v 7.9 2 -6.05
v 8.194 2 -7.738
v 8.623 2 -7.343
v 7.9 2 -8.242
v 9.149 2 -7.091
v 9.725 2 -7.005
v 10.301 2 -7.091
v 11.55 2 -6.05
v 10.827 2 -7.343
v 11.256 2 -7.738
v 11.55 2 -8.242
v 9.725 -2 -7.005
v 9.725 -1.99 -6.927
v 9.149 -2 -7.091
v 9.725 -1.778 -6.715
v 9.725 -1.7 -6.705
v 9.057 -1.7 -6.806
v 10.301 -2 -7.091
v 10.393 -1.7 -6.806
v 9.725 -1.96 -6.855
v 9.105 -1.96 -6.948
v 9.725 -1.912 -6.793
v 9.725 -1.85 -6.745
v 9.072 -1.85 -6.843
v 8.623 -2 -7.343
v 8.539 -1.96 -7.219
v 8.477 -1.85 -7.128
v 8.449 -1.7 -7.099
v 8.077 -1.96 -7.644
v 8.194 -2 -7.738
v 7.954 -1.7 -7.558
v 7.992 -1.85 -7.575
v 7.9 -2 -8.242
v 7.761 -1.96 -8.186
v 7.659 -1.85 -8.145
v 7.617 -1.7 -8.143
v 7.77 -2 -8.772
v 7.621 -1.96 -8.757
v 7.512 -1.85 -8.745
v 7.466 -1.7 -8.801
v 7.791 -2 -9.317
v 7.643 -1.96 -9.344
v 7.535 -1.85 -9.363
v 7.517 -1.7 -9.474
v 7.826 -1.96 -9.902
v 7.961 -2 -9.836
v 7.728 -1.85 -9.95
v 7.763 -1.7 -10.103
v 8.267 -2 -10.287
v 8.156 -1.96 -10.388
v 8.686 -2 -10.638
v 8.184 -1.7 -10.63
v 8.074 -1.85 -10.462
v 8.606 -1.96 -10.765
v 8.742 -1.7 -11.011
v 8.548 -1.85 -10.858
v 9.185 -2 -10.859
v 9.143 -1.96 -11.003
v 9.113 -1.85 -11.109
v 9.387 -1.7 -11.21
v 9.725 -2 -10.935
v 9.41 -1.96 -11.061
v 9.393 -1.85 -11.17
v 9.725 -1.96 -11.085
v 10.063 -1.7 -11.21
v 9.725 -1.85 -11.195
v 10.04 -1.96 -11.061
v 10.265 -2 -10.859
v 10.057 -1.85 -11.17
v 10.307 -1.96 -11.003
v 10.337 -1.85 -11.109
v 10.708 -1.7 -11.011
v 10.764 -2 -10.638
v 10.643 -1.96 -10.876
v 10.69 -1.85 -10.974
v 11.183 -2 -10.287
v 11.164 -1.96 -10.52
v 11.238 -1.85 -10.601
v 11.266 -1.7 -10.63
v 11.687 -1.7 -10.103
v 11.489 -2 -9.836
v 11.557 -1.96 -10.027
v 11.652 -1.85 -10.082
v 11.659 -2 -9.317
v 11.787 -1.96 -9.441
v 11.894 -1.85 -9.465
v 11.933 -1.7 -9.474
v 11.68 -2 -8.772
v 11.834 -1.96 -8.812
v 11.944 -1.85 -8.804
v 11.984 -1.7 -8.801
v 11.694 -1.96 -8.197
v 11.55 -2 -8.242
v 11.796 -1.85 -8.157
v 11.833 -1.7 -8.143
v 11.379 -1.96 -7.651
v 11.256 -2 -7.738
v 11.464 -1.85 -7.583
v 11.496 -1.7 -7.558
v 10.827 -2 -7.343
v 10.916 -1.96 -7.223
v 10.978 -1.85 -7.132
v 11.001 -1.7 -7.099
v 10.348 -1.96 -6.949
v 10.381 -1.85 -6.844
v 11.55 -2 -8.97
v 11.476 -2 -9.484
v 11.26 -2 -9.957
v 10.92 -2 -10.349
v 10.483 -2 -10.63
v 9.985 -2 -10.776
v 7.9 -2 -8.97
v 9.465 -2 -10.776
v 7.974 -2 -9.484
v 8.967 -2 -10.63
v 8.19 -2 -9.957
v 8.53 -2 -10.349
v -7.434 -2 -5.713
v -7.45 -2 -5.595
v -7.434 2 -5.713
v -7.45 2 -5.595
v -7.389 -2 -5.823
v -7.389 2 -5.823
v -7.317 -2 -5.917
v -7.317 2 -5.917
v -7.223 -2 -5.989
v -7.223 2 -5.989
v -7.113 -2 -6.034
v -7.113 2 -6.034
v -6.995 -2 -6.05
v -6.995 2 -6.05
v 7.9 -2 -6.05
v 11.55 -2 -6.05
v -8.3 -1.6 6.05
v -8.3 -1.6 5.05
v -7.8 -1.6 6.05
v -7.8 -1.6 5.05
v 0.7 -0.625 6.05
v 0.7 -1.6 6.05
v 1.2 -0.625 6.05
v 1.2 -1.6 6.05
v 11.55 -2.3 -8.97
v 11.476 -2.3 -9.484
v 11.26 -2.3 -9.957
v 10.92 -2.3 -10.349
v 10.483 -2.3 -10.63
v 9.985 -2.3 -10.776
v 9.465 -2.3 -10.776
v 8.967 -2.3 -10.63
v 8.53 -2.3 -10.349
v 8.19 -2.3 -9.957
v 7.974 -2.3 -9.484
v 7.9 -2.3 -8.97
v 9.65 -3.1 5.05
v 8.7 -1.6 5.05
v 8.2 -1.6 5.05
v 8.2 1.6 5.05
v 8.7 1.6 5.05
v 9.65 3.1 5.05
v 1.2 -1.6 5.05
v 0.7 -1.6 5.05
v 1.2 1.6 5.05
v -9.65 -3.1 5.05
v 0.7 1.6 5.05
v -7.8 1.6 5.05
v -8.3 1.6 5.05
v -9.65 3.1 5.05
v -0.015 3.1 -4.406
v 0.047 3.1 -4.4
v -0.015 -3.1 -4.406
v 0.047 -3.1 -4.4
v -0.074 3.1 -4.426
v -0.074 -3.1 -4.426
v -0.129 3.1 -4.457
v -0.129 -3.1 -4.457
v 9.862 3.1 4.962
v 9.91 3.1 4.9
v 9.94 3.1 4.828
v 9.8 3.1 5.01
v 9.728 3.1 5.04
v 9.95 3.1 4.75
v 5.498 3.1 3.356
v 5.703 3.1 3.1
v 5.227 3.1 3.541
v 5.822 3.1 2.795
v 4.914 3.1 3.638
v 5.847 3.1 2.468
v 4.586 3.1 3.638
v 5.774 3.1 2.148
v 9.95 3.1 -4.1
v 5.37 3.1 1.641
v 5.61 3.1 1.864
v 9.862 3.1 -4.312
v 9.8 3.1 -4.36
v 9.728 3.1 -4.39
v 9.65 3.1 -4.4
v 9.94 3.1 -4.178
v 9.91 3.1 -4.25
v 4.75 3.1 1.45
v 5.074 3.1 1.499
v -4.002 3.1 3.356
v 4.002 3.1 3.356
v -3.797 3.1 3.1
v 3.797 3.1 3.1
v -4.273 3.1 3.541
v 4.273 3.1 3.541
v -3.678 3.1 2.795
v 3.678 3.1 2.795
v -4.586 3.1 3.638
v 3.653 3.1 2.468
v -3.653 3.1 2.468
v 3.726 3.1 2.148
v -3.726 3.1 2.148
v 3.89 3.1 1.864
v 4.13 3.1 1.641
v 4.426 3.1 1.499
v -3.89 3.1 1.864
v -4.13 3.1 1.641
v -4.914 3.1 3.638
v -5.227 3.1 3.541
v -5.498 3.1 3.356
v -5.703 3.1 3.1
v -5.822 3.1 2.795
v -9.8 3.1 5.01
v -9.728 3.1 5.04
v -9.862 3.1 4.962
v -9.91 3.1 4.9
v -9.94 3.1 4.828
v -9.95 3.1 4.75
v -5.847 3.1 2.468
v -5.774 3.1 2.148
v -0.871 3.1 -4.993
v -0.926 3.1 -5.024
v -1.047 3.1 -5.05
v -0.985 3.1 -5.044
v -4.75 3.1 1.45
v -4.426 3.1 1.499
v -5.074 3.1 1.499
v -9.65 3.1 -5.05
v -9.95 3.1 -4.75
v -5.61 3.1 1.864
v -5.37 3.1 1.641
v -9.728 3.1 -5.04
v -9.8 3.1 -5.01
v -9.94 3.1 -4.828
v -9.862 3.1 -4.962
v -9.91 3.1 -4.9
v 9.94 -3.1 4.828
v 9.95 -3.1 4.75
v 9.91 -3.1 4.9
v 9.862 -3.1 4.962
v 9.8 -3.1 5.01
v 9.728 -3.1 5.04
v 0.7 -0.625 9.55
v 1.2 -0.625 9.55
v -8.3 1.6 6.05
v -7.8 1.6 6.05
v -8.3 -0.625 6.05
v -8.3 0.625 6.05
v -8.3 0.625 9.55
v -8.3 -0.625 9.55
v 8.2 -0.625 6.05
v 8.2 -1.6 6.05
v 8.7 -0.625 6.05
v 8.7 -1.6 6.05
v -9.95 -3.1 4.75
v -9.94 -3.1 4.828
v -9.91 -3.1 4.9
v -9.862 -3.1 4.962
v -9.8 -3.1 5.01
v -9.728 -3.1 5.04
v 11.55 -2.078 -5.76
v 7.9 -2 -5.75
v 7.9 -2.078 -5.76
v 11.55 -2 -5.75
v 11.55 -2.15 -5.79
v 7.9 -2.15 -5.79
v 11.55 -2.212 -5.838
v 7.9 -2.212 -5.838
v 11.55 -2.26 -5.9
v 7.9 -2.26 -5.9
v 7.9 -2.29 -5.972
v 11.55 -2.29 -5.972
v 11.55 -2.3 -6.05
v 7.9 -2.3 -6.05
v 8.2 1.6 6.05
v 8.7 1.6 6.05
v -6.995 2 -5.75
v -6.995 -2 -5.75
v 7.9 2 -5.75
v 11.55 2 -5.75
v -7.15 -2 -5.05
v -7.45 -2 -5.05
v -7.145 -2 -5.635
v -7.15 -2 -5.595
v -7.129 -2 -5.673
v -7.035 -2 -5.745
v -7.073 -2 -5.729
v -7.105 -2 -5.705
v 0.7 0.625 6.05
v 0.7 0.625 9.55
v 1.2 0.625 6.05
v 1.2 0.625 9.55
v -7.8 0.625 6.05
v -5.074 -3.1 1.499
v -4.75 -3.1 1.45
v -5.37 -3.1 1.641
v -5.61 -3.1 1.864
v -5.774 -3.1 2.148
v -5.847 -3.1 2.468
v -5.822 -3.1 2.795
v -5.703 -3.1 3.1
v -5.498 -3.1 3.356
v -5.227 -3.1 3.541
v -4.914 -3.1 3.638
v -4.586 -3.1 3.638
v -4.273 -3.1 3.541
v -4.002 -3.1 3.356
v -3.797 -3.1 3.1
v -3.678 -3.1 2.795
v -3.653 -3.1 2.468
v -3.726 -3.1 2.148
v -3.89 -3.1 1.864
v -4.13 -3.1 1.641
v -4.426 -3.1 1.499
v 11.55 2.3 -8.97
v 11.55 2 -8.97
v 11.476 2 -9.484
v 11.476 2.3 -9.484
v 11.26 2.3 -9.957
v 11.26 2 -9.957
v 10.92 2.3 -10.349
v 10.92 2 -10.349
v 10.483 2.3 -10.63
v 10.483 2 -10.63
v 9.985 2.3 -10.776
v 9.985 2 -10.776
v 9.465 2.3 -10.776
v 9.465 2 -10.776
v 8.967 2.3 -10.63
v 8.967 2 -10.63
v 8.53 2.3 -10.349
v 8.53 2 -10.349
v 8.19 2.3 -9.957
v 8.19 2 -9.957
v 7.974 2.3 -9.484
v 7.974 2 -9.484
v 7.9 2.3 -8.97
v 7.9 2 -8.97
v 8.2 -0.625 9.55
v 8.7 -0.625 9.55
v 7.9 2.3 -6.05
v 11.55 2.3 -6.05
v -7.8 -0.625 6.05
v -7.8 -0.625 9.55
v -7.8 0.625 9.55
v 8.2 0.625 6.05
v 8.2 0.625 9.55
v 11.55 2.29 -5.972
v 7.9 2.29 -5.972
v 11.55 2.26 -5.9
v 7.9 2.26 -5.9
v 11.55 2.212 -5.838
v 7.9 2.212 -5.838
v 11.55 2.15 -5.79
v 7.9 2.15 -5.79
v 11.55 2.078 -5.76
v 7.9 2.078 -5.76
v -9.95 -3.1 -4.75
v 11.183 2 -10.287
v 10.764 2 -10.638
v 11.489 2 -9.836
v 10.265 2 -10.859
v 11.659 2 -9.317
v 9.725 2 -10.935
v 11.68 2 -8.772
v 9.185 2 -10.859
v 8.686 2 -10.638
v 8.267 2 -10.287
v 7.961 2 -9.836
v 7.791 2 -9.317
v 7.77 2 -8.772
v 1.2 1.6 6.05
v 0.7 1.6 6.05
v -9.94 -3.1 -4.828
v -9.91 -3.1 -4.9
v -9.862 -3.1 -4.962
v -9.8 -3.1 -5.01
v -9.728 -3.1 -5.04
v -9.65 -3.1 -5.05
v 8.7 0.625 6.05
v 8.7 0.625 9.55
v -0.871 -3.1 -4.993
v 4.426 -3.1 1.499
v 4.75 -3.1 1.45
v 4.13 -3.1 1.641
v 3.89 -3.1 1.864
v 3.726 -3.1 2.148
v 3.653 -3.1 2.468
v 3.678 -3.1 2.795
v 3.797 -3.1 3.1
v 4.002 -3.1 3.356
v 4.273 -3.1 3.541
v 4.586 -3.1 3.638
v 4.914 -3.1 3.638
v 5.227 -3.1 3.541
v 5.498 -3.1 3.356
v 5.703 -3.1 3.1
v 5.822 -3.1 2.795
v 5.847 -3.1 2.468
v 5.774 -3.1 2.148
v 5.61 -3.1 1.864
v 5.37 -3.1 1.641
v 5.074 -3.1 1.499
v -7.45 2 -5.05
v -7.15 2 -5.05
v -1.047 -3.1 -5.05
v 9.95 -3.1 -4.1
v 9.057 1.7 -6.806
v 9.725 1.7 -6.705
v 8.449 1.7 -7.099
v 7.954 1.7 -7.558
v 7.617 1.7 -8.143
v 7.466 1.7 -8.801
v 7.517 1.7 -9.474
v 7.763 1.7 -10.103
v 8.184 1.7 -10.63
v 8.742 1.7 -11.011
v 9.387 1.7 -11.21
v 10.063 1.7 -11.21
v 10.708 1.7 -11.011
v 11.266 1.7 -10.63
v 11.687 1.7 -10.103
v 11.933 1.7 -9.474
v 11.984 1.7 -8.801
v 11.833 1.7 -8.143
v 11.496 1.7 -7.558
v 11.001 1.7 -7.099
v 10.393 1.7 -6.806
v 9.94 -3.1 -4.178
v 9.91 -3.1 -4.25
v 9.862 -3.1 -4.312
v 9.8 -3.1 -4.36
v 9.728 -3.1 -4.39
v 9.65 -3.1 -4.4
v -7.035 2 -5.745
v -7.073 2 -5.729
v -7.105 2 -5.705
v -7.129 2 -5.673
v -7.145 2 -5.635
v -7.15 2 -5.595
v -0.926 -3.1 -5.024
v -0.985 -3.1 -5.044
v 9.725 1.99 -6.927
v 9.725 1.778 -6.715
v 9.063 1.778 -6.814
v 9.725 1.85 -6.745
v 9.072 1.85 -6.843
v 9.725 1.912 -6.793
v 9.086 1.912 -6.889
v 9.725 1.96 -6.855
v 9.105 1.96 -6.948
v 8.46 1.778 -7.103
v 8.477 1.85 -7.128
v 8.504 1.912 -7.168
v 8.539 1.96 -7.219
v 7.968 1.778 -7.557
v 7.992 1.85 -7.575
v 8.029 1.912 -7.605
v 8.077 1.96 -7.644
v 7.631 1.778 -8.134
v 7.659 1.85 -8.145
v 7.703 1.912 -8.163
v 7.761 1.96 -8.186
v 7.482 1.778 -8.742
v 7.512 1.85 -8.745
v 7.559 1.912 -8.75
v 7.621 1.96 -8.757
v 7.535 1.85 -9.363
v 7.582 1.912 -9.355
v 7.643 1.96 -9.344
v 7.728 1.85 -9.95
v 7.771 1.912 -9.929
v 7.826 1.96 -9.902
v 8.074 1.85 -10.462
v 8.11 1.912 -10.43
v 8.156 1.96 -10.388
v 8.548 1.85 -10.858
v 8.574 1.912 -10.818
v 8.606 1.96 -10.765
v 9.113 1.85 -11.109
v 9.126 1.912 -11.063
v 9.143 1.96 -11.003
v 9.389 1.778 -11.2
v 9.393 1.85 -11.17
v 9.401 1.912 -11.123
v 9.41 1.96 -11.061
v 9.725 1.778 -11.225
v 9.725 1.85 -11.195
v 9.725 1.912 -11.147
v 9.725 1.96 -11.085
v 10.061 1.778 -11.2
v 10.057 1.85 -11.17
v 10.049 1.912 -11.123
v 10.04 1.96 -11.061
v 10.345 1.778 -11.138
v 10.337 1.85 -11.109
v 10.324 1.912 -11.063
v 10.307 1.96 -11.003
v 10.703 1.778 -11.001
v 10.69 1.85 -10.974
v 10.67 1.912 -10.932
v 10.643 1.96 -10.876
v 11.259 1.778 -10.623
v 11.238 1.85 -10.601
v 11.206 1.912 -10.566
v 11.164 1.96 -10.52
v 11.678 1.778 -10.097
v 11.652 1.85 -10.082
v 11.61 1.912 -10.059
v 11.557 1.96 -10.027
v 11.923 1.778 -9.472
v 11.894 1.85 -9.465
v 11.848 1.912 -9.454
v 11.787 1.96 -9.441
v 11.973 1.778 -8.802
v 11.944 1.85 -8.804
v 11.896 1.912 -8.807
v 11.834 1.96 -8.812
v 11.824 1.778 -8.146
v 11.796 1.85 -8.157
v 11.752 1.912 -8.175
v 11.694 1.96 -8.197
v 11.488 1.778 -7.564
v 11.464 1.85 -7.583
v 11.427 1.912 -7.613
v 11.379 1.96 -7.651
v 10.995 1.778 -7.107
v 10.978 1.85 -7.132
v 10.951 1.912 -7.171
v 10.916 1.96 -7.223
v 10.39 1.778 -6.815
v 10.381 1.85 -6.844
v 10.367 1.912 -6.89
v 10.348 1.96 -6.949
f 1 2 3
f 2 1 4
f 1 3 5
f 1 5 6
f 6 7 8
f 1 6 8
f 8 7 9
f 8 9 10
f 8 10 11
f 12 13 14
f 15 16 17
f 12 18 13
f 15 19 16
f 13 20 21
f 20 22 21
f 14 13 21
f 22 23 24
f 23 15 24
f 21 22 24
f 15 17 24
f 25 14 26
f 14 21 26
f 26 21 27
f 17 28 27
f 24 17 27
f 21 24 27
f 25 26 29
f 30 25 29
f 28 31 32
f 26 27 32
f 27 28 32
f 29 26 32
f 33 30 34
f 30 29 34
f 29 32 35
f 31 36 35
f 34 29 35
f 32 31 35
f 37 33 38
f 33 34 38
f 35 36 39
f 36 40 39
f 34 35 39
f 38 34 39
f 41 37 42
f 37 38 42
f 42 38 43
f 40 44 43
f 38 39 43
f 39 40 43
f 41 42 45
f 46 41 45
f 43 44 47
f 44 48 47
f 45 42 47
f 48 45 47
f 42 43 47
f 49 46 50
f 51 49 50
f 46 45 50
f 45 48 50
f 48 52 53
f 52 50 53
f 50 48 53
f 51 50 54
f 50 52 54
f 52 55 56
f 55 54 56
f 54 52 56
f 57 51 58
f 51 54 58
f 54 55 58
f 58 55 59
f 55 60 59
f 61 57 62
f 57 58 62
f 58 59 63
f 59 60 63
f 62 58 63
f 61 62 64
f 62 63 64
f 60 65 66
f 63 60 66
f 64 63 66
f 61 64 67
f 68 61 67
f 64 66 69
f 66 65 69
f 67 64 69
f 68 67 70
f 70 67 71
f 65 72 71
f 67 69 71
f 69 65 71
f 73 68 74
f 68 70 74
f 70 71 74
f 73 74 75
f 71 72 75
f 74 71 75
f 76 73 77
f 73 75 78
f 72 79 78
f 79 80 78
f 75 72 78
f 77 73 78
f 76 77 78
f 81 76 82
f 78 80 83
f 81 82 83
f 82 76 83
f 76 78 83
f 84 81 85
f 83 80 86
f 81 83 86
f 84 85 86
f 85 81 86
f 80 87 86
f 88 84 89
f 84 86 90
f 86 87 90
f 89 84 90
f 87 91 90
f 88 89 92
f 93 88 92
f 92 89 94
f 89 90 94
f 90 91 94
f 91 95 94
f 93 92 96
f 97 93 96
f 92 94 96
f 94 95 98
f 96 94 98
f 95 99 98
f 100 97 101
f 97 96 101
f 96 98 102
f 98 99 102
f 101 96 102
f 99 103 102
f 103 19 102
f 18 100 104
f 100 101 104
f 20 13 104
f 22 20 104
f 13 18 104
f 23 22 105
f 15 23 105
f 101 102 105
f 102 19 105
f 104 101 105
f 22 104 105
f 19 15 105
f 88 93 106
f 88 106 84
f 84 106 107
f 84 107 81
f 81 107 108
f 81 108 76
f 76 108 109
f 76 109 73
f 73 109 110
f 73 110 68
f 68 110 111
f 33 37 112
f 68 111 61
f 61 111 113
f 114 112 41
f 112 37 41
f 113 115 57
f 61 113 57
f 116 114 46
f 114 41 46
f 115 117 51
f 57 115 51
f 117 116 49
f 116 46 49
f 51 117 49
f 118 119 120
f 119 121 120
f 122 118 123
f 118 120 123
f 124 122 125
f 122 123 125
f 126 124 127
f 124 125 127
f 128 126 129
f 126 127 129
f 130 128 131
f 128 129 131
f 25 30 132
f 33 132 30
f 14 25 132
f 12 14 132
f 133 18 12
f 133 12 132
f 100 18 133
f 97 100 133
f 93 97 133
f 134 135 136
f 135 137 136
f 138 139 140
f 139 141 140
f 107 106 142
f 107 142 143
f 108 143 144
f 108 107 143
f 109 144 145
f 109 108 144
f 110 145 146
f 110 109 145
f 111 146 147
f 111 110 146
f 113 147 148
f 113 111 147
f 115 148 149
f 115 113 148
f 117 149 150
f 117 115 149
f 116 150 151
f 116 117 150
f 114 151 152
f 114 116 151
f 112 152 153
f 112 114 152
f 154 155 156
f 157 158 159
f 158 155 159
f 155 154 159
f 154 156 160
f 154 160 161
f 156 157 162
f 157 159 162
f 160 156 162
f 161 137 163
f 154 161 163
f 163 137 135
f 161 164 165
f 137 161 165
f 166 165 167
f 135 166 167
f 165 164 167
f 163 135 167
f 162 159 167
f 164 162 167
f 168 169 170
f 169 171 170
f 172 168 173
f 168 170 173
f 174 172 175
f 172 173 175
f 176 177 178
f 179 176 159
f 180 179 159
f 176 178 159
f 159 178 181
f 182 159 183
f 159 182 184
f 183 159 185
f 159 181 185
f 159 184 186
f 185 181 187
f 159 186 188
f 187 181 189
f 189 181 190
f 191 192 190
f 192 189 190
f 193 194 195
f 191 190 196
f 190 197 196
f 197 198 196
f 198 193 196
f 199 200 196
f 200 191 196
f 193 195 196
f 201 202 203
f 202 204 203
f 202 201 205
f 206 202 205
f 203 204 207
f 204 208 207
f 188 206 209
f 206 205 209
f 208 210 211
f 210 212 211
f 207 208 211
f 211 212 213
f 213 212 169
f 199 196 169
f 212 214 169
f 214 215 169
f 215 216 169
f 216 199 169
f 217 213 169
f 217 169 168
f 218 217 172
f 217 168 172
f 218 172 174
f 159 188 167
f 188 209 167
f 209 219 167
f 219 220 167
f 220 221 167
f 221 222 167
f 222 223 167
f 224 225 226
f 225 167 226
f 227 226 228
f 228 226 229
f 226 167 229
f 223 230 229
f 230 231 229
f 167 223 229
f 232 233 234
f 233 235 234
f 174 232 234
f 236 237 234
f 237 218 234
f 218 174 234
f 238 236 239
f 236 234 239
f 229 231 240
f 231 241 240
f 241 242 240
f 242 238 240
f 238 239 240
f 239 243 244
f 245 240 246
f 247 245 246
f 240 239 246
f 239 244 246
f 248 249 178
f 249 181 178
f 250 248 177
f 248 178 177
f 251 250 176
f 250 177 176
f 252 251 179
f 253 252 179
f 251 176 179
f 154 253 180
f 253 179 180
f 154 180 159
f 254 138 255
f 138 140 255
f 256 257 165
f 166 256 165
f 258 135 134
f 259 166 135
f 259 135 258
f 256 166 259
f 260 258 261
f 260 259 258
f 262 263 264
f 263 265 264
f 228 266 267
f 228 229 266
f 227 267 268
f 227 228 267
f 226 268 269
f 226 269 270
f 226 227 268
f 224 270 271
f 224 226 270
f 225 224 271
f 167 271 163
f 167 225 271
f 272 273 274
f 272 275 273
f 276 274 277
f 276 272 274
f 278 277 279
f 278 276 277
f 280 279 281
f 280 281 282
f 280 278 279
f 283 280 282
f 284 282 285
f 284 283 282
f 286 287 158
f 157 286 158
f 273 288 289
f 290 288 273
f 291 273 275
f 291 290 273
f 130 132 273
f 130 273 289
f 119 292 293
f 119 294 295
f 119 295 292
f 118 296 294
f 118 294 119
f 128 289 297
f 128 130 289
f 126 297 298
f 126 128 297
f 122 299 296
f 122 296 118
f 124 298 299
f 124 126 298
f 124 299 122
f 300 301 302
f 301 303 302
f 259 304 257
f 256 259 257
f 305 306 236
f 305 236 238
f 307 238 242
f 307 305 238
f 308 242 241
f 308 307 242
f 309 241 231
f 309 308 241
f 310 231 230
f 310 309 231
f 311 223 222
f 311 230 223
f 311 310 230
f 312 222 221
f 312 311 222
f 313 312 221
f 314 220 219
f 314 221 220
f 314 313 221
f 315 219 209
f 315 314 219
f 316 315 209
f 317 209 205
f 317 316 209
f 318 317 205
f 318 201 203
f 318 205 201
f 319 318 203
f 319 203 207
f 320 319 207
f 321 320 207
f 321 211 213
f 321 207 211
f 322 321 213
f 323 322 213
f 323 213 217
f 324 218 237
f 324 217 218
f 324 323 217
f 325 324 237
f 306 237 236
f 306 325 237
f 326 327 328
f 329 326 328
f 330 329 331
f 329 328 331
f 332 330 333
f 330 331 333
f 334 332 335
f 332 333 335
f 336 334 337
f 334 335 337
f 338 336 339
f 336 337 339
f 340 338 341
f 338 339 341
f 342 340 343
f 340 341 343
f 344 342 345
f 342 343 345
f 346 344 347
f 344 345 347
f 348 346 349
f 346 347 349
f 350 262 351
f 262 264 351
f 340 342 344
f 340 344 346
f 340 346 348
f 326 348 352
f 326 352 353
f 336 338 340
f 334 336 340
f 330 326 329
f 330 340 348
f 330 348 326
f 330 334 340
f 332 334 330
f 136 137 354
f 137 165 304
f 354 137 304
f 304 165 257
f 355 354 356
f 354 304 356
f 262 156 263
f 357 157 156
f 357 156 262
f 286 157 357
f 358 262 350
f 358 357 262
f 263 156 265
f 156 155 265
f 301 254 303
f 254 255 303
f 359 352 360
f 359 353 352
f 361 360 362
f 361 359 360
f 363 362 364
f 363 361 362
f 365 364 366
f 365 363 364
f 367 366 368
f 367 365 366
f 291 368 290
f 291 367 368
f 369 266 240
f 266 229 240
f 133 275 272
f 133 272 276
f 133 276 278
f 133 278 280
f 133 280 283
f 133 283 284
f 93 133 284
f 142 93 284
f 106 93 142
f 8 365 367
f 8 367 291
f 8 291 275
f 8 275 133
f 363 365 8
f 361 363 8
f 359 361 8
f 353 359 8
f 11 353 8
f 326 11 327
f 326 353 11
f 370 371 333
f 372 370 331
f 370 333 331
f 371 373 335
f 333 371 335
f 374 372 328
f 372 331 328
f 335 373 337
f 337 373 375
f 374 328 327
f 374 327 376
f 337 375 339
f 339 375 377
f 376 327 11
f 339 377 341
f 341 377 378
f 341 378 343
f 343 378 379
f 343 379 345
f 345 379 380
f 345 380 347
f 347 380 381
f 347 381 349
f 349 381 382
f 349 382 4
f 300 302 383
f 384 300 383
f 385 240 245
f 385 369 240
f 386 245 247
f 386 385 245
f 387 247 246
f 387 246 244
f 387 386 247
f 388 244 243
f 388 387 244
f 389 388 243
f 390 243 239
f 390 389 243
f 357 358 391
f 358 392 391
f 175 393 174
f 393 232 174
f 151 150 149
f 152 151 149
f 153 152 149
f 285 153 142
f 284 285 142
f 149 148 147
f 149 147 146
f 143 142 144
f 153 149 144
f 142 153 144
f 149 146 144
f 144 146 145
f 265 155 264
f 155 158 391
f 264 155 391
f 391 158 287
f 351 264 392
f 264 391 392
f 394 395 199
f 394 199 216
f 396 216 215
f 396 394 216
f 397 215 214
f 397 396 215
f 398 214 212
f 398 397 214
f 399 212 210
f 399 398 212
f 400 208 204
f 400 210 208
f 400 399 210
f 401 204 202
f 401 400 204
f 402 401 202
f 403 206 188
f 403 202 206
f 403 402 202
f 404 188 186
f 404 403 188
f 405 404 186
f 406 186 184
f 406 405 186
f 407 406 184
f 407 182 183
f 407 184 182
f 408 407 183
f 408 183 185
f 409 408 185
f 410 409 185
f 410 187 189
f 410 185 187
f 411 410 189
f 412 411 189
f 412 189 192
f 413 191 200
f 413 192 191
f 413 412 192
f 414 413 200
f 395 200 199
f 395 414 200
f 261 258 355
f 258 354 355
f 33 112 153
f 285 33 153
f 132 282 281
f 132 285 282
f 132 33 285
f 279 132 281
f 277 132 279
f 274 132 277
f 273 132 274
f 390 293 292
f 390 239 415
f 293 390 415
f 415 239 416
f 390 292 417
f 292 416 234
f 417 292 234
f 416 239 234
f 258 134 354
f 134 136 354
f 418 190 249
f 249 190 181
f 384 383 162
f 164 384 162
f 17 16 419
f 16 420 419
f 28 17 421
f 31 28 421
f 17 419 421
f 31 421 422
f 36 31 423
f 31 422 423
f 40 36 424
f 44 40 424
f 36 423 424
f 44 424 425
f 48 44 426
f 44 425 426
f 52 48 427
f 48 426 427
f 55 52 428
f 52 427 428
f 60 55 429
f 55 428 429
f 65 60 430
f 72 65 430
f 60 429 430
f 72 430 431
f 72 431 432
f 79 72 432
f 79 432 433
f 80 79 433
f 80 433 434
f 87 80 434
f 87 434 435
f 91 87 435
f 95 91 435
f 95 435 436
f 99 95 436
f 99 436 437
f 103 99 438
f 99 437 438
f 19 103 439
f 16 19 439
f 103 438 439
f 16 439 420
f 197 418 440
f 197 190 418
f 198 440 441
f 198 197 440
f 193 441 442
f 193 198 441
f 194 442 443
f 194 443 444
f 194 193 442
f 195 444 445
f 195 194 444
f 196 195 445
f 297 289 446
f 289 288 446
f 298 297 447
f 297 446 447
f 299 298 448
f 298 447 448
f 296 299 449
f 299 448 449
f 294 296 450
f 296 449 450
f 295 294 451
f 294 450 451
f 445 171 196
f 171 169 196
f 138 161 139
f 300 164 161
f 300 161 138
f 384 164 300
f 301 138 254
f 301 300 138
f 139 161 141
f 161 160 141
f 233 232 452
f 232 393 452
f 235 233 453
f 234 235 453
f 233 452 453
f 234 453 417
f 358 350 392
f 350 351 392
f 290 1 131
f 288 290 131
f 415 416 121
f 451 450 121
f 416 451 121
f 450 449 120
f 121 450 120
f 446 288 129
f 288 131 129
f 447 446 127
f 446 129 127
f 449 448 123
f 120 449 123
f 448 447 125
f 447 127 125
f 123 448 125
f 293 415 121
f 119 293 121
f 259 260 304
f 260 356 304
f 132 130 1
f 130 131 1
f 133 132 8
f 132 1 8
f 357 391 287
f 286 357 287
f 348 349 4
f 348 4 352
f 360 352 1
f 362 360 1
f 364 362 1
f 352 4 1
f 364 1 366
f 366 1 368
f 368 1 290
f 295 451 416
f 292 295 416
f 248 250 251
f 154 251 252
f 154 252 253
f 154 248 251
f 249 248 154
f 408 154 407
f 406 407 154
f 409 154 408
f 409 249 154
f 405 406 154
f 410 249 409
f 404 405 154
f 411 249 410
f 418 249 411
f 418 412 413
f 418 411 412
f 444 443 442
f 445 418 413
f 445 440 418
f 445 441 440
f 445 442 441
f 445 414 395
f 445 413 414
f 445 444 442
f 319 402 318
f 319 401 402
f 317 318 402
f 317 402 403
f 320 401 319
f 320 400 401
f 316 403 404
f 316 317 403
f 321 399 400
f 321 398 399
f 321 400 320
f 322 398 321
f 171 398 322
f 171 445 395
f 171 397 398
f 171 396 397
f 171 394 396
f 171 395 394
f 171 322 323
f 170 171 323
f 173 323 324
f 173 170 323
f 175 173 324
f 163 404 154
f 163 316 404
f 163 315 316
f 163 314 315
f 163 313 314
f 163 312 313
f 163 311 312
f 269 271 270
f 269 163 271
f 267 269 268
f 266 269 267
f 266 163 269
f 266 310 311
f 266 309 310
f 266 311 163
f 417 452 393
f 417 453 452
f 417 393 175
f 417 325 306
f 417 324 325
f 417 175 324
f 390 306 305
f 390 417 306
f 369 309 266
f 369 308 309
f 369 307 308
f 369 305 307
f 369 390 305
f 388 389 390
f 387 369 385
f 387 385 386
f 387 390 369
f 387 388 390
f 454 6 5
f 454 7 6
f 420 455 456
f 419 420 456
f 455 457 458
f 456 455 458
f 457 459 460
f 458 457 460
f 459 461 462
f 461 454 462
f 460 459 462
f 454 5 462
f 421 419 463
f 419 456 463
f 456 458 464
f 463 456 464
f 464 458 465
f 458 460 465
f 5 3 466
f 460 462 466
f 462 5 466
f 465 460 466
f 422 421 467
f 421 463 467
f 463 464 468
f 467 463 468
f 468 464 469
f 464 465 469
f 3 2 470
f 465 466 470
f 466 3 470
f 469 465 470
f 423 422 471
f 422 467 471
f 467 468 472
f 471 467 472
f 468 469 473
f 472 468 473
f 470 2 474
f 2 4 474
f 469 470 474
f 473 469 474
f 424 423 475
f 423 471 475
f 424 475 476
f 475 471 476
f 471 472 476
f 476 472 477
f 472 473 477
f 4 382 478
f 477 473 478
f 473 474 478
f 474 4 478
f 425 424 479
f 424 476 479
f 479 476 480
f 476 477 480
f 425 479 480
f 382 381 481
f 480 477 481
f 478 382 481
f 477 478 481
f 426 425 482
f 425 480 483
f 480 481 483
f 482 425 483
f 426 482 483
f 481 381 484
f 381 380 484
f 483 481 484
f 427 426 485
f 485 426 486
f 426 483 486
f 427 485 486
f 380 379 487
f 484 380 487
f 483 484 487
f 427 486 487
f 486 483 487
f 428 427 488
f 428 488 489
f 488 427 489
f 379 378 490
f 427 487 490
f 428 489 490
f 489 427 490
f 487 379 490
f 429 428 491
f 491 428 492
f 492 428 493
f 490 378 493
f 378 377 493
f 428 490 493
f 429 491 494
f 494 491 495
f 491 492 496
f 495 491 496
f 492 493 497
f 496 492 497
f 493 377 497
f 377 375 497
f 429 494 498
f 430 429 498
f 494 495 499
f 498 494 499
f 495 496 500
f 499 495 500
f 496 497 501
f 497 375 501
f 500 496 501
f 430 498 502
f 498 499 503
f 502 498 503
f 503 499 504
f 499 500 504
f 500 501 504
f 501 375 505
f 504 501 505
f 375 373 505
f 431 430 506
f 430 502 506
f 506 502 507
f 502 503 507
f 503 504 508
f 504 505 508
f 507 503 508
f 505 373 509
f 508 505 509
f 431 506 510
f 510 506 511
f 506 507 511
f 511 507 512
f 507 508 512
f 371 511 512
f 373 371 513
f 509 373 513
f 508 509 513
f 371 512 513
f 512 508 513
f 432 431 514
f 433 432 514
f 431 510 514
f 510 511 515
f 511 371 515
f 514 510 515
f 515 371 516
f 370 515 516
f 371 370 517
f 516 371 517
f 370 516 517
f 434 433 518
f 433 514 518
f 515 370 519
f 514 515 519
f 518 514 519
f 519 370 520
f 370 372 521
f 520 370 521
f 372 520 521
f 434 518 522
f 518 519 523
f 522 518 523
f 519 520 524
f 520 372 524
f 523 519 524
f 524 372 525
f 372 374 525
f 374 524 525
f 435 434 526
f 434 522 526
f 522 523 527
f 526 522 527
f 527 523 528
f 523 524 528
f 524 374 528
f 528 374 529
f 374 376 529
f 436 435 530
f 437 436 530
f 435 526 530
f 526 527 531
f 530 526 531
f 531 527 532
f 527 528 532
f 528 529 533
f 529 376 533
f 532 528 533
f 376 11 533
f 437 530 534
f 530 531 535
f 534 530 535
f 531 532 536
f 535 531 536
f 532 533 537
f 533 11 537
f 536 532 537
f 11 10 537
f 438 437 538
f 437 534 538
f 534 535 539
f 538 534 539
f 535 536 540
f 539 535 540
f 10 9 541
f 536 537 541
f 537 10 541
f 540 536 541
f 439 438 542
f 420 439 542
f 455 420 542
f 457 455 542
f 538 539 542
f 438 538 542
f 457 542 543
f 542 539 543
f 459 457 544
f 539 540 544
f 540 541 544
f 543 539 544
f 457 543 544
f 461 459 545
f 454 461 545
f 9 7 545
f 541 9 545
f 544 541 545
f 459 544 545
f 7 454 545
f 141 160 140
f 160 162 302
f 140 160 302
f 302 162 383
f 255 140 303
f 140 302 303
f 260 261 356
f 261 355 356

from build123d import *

# Parameters (mm, degrees)
BOSS_EXTRU_1_DEPTH           = 3.1
CONG_1_R                     = 0.3
ENL_V_MAT_EXTRU_2_DEPTH      = 12.580803081
ENL_V_MAT_EXTRU_2_DEPTH_BACK = 12.580803081
ESQUISSE2_R                  = 1.1
BOSS_EXTRU_2_DEPTH           = 2
BOSS_EXTRU_3_DEPTH           = 0.3
CONG_2_R                     = 0.3
CONG_2_OF_SYM_TRIE1_R        = 0.3
BOSS_EXTRU_5_DEPTH           = 0.25
R_P_TITION_LIN_AIRE1_COUNT   = 2
R_P_TITION_LIN_AIRE1_PITCH   = 7.5
R_P_TITION_LIN_AIRE2_COUNT   = 2
R_P_TITION_LIN_AIRE2_PITCH   = 16.5


with BuildPart() as part:
    # Esquisse1 → Boss.-Extru.1 (new, symmetric)
    with BuildSketch(Plane(origin=(0, 0, 0), x_dir=(1, 0, 0), z_dir=(0, 1, 0))):
        Polygon((-9.95, -5.05), (-9.95, 5.05), (-0.95, 5.05), (-0.05, 4.4), (9.95, 4.4), (9.95, -5.05), align=None)
    extrude(amount=BOSS_EXTRU_1_DEPTH, both=True)

    # Congé1
    cong_1_edges = [part.edges().sort_by_distance(p)[0] for p in [
        (-9.95, 0, 5.05),
        (-9.95, 0, -5.05),
        (-0.95, 0, -5.05),
        (-0.05, 0, -4.4),
        (9.95, 0, -4.4),
        (9.95, 0, 5.05),
    ]]
    fillet(cong_1_edges, radius=CONG_1_R)

    # Esquisse2 → Enlèv. mat.-Extru.2 (cut, two sides: drawn at the far end of the back side and taken through both)
    with BuildSketch(Plane(origin=(0, 0, 0), x_dir=(1, 0, 0), z_dir=(0, 1, 0)).offset(-ENL_V_MAT_EXTRU_2_DEPTH_BACK)):
        with Locations(Location((-4.75, -2.55, 0), (0, 0, 90))):
            Circle(ESQUISSE2_R)
        with Locations(Location((4.75, -2.55, 0), (0, 0, 90))):
            Circle(ESQUISSE2_R)
    extrude(amount=ENL_V_MAT_EXTRU_2_DEPTH + ENL_V_MAT_EXTRU_2_DEPTH_BACK, mode=Mode.SUBTRACT)

    # Esquisse3 → Boss.-Extru.2 (add, symmetric)
    with BuildSketch(Plane(origin=(0, 0, 0), x_dir=(1, 0, 0), z_dir=(0, 1, 0))):
        with BuildLine():
            Line((-7.45, 5.05), (-7.45, 5.595028059))
            ThreePointArc((-7.45, 5.595028059), (-7.316741804, 5.916741804), (-6.995028059, 6.05))
            Line((-6.995028059, 6.05), (11.55, 6.05))
            Line((11.55, 6.05), (11.55, 5.75))
            Line((11.55, 5.75), (-6.9950313, 5.75))
            ThreePointArc((-6.9950313, 5.75), (-7.104610915, 5.704608624), (-7.15, 5.595028059))
            Line((-7.15, 5.595028059), (-7.15, 5.05))
            Line((-7.15, 5.05), (-7.45, 5.05))
        make_face()
    extrude(amount=BOSS_EXTRU_2_DEPTH, both=True)

    # Esquisse4 → Boss.-Extru.3 (add)
    with BuildSketch(Plane(origin=(0, 2, 0), x_dir=(1, 0, 0), z_dir=(0, 1, 0))):
        with BuildLine():
            Line((11.55, 5.75), (11.55, 8.97))
            ThreePointArc((11.55, 8.97), (9.725, 10.795), (7.9, 8.97))
            Line((7.9, 8.97), (7.9, 5.75))
            Line((7.9, 5.75), (11.55, 5.75))
        make_face()
    boss_extru_3 = extrude(amount=BOSS_EXTRU_3_DEPTH)

    # Congé2
    cong_2_edges = [part.edges().sort_by_distance(p)[0] for p in [
        (9.725, 2.3, -5.75),
    ]]
    fillet(cong_2_edges, radius=CONG_2_R)

    # Symétrie1: Boss.-Extru.3 across plane
    add(boss_extru_3.mirror(Plane.ZX))

    # Congé2 of Symétrie1
    cong_2_of_sym_trie1_edges = [part.edges().sort_by_distance(p)[0] for p in [
        (9.725, -2.3, -5.75),
    ]]
    fillet(cong_2_of_sym_trie1_edges, radius=CONG_2_OF_SYM_TRIE1_R)

    # Esquisse6 → Révolution1 (revolve)
    with BuildSketch(Plane.XY.offset(-8.97), mode=Mode.PRIVATE) as r_volution1_sk:
        with BuildLine():
            Line((9.725, 2), (9.725, -2))
            Line((9.725, -2), (11.69, -2))
            ThreePointArc((11.69, -2), (11.902132034, -1.912132034), (11.99, -1.7))
            Line((11.99, -1.7), (11.99, 1.7))
            ThreePointArc((11.99, 1.7), (11.902132034, 1.912132034), (11.69, 2))
            Line((11.69, 2), (9.725, 2))
        make_face()
    revolve(r_volution1_sk.sketch.rotate(Axis((9.725, 2, -8.97), (0, -1, 0)), 90), axis=Axis((9.725, 2, -8.97), (0, -1, 0)))

    # Esquisse7 → Boss.-Extru.5 (add, symmetric)
    with BuildSketch(Plane(origin=(8.45, 0, 0), x_dir=(0, 0, -1), z_dir=(1, 0, 0))):
        Polygon((-5.05, 1.6), (-5.05, -1.6), (-6.05, -1.6), (-6.05, -0.625), (-9.55, -0.625), (-9.55, 0.625), (-6.05, 0.625), (-6.05, 1.6), align=None)
    boss_extru_5 = extrude(amount=BOSS_EXTRU_5_DEPTH, both=True)

    # Répétition linéaire1: Boss.-Extru.5 ×2
    with Locations(*[(-i * R_P_TITION_LIN_AIRE1_PITCH, 0, 0) for i in range(1, R_P_TITION_LIN_AIRE1_COUNT)]):
        add(boss_extru_5)

    # Répétition linéaire2: Boss.-Extru.5 ×2
    with Locations(*[(-i * R_P_TITION_LIN_AIRE2_PITCH, 0, 0) for i in range(1, R_P_TITION_LIN_AIRE2_COUNT)]):
        add(boss_extru_5)


solid = part.part
